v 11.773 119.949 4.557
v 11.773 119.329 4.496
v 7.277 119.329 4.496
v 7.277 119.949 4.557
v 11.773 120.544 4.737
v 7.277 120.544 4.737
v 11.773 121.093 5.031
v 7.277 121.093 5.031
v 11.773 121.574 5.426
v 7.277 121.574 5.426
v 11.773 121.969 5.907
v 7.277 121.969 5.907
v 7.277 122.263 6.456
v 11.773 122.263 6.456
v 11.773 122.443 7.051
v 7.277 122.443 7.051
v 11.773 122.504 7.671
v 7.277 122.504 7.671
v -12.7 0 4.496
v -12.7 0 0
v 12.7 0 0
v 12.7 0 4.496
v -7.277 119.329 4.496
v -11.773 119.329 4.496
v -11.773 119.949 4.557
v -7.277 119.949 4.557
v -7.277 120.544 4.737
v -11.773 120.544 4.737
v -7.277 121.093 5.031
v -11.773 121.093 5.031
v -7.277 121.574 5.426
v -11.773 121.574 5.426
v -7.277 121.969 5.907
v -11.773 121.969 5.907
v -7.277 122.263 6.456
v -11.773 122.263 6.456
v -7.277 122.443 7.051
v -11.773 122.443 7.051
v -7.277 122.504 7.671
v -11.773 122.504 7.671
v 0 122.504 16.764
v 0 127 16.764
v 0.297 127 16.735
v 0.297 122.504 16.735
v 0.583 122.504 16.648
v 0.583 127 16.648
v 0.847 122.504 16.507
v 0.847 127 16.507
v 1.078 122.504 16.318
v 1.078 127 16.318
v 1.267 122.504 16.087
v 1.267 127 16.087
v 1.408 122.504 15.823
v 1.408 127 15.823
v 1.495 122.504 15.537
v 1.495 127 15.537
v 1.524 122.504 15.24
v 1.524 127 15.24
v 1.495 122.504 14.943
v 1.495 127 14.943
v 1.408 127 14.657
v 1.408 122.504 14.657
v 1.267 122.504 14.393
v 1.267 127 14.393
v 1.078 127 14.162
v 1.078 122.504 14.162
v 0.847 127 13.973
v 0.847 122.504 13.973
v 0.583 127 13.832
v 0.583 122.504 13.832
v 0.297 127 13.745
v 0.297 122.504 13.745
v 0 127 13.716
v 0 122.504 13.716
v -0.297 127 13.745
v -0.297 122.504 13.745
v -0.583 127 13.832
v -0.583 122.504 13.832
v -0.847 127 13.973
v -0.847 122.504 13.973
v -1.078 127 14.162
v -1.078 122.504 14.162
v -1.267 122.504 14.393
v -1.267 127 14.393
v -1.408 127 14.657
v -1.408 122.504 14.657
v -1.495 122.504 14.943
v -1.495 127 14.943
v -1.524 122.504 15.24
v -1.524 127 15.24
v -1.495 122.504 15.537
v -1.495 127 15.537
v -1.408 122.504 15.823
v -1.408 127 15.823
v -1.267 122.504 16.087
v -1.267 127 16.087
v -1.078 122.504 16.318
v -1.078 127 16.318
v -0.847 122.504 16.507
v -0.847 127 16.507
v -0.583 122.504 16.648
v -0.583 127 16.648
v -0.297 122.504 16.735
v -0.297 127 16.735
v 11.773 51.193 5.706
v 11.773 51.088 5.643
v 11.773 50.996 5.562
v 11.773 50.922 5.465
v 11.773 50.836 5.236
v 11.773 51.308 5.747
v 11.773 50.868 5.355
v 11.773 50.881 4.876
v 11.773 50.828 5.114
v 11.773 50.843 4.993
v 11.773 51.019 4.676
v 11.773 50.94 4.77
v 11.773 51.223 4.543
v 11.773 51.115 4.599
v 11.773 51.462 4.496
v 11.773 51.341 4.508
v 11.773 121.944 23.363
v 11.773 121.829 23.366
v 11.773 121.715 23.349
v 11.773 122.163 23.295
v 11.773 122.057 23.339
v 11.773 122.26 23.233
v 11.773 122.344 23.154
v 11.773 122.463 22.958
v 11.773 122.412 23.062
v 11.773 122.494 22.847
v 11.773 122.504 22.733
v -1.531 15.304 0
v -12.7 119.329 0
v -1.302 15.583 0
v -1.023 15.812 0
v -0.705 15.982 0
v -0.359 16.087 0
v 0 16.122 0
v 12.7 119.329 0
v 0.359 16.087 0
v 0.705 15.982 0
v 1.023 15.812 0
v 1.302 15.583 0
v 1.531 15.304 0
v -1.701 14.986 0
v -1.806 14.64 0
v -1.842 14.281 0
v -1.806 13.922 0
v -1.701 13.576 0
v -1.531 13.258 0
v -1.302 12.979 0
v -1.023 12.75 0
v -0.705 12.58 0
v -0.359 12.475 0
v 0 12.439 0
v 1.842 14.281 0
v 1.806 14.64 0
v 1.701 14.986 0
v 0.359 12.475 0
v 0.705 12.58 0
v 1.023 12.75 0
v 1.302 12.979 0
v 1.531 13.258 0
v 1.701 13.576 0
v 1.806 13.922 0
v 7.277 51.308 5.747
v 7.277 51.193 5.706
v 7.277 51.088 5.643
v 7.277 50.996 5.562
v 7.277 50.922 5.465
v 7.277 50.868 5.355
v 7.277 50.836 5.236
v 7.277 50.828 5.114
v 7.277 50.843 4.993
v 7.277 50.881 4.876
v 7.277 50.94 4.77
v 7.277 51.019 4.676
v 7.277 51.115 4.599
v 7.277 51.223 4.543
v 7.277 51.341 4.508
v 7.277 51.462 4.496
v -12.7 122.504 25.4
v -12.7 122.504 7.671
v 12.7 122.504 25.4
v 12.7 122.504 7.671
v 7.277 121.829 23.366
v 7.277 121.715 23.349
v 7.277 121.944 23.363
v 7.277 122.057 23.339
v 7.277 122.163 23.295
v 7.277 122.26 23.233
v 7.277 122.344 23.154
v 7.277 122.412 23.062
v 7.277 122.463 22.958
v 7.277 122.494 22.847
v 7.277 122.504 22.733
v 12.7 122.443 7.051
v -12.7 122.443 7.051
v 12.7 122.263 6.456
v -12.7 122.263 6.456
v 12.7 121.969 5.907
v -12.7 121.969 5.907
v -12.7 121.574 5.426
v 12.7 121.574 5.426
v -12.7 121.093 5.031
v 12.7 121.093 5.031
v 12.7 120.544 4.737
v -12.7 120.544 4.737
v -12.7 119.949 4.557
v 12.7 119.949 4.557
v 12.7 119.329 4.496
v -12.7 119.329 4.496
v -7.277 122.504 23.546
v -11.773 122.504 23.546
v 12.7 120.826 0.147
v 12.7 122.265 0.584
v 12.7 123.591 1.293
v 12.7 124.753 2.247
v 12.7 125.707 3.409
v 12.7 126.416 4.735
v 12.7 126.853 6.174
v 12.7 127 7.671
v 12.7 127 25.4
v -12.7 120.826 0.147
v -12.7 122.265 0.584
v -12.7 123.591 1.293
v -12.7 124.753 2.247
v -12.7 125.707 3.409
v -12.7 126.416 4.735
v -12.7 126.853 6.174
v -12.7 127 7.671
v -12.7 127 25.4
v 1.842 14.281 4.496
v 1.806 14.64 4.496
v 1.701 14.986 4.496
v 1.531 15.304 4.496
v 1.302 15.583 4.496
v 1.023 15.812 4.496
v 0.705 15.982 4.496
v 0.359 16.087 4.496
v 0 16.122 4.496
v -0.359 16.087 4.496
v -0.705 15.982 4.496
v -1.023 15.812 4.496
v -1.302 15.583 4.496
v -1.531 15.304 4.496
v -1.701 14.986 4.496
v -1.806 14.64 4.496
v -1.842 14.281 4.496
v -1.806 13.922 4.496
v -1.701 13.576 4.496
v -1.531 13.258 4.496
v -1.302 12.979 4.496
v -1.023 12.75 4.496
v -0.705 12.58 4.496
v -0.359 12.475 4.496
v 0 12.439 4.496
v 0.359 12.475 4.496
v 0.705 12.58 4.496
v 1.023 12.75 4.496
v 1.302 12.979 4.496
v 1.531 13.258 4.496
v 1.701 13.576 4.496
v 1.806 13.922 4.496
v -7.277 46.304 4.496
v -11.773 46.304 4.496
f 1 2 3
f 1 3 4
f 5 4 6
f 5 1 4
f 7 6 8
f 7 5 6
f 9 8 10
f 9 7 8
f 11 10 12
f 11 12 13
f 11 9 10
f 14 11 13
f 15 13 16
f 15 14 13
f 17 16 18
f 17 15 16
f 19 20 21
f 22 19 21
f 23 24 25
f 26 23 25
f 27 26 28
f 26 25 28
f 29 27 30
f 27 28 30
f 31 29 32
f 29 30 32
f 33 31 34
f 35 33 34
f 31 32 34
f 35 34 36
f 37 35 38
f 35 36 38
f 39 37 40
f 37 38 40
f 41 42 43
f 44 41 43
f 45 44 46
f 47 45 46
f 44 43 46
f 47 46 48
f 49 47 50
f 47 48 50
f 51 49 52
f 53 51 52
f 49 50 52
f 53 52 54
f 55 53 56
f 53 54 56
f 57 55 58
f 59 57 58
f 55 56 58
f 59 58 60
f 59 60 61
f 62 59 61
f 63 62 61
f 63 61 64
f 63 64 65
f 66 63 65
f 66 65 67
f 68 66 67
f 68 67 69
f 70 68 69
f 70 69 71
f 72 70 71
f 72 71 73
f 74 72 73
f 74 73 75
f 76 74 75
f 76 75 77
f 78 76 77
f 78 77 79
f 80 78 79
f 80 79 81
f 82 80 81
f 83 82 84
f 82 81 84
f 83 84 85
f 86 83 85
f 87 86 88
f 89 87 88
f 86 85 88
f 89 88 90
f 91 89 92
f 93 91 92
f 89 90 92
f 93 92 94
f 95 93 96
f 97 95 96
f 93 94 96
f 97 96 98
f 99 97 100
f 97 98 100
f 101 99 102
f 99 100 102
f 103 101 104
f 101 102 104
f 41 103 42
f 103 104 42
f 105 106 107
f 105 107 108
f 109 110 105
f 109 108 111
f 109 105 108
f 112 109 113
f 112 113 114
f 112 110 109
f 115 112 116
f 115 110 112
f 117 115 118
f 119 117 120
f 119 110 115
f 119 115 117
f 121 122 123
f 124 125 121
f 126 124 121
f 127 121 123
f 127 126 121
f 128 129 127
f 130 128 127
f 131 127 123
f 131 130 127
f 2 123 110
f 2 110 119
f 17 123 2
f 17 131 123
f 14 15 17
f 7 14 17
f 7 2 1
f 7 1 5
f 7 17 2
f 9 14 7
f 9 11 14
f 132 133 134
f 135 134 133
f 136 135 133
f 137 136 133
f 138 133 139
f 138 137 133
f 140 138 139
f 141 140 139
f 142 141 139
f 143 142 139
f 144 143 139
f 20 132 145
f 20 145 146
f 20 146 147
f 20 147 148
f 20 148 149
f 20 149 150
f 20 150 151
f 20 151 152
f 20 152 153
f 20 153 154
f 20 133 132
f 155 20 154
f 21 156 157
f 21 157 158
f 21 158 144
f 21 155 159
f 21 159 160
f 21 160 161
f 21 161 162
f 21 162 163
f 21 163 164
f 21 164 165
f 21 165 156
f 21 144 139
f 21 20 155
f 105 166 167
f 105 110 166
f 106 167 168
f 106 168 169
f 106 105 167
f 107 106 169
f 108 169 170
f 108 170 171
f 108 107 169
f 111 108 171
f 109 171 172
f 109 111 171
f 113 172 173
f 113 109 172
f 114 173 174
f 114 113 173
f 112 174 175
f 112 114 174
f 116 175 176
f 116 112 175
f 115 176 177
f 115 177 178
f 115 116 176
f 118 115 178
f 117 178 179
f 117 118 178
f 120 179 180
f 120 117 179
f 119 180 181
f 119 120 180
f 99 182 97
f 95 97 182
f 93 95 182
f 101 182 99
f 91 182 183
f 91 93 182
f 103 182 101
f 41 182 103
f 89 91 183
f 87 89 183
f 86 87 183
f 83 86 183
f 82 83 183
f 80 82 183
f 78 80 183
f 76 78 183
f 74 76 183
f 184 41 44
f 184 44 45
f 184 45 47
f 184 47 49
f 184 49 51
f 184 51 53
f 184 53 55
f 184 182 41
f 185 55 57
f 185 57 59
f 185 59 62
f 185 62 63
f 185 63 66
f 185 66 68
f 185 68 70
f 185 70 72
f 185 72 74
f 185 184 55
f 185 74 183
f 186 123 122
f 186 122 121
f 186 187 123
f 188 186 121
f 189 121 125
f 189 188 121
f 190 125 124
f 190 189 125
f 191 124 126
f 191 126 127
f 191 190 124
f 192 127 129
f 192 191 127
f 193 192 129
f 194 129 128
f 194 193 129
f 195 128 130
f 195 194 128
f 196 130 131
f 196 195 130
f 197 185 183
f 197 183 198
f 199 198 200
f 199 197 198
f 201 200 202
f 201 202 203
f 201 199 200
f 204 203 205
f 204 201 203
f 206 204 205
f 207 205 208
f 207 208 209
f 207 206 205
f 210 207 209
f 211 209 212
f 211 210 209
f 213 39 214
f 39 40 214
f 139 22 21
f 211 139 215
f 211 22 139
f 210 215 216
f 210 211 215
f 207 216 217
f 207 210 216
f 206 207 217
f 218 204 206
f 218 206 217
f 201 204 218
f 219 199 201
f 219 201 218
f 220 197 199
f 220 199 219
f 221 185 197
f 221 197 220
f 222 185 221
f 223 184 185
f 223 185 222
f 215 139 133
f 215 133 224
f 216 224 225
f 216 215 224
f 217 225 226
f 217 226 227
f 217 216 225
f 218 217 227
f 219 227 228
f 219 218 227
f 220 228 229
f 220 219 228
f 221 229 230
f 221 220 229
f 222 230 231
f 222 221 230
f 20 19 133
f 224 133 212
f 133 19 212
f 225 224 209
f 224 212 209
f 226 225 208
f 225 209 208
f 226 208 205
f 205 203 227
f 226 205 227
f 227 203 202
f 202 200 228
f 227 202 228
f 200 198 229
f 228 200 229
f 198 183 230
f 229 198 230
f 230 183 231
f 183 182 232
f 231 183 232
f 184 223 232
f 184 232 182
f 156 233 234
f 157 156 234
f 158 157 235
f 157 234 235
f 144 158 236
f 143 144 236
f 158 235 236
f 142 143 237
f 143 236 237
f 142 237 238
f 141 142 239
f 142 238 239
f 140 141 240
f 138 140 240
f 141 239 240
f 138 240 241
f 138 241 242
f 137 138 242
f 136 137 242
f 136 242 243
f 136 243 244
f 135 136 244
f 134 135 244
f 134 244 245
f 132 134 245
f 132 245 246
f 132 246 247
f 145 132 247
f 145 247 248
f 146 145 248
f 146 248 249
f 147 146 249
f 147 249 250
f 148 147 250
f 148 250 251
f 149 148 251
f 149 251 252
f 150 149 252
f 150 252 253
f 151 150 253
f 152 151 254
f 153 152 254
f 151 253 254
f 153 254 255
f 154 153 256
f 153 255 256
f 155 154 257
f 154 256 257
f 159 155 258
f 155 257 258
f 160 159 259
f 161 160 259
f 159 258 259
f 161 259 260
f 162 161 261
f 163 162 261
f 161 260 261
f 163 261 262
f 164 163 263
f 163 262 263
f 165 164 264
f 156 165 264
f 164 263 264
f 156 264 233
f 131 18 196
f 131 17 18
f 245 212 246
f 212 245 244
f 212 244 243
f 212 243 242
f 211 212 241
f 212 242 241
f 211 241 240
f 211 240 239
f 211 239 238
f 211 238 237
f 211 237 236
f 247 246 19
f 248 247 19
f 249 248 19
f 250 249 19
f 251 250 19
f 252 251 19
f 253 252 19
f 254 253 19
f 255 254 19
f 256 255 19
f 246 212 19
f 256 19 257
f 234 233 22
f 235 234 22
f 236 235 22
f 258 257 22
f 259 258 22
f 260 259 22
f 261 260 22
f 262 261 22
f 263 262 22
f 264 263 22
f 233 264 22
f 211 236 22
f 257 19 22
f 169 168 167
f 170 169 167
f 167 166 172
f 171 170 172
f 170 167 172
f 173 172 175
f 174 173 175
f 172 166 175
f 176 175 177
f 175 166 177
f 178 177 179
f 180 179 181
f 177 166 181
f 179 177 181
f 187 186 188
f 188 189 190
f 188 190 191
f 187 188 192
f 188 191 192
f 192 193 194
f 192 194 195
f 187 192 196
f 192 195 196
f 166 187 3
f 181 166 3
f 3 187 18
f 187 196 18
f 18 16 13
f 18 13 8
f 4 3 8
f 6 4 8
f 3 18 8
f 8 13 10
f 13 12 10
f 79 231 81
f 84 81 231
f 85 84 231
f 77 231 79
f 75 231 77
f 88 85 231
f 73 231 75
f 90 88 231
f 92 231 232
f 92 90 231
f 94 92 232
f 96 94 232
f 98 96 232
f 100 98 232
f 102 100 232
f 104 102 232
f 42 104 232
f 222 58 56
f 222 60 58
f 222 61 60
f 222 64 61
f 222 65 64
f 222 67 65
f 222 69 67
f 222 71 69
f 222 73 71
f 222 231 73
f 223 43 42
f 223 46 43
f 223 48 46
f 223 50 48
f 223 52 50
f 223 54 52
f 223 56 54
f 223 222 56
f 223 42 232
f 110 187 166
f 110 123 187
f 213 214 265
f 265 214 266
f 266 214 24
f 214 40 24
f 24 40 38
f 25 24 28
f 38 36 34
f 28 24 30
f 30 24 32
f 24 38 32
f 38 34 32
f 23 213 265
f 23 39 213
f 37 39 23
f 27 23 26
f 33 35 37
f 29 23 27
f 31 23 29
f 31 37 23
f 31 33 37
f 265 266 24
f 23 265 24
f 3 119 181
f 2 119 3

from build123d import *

# Parameters (mm, degrees)
SKETCH2_W                    = 25.4
SKETCH2_H                    = 4.4958
BASE_FLANGE1_DEPTH           = 127
EDGE_FLANGE1_STRIP_W         = 24.3332
EDGE_FLANGE1_STRIP_H         = 4.4958
EDGE_FLANGE1_STRIP_CUT_DEPTH = 25.4
EDGE_FLANGE1_DEPTH           = 25.4
CUT_EXTRUDE1_REACH           = 132.136
SKETCH10_R                   = 1.524
SKETCH11_R                   = 1.8415
CUT_EXTRUDE2_DEPTH           = 130.333969156
BOSS_EXTRUDE1_START          = 9.525
BOSS_EXTRUDE1_DEPTH          = 2.2479
FILLET1_R                    = 0.635


# Sheet-metal steps are written as plain solids
with BuildPart() as part:
    # Sketch2 → Base-Flange1 (new body)
    with BuildSketch(Plane(origin=(0, 0, 0), x_dir=(1, 0, 0), z_dir=(0, 1, 0))):
        with Locations((0, -2.2479)):
            Rectangle(SKETCH2_W, SKETCH2_H)
    extrude(amount=BASE_FLANGE1_DEPTH)

    # Edge-Flange1 strip (across the edge) → Edge-Flange1 strip cut (cut)
    with BuildSketch(Plane(origin=(12.7, 127, 4.4958), x_dir=(0, -1, 0), z_dir=(-1, 0, 0))):
        with Locations((-4.4958, -2.2479)):
            Rectangle(EDGE_FLANGE1_STRIP_W, EDGE_FLANGE1_STRIP_H)
    extrude(amount=EDGE_FLANGE1_STRIP_CUT_DEPTH, mode=Mode.SUBTRACT)

    # Edge-Flange1 section (across the edge) → Edge-Flange1 (add)
    with BuildSketch(Plane(origin=(12.7, 127, 4.4958), x_dir=(0, -1, 0), z_dir=(-1, 0, 0))):
        with BuildLine():
            Line((0, 3.175), (0, 20.9042))
            Line((0, 20.9042), (4.4958, 20.9042))
            Line((4.4958, 20.9042), (4.4958, 3.175))
            ThreePointArc((4.4958, 3.175), (5.42573597, 0.92993597), (7.6708, 0))
            Line((7.6708, 0), (7.6708, -4.4958))
            ThreePointArc((7.6708, -4.4958), (2.246725303, -2.249074697), (0, 3.175))
        make_face()
    extrude(amount=EDGE_FLANGE1_DEPTH)

    # Sketch10 → Cut-Extrude1 (cut, up to next)
    with BuildSketch(Plane(origin=(0, 127, 0), x_dir=(1, 0, 0), z_dir=(0, 1, 0)), mode=Mode.PRIVATE) as cut_extrude1_sk1:
        with Locations(Location((0, -15.24, 0), (0, 0, 270))):
            Circle(SKETCH10_R)
    cut_extrude1_tool1 = extrude(cut_extrude1_sk1.sketch, amount=-CUT_EXTRUDE1_REACH, mode=Mode.PRIVATE) & part.part
    add(cut_extrude1_tool1.solids().sort_by_distance((0, 127, 15.24))[0], mode=Mode.SUBTRACT)

    # Sketch11 → Cut-Extrude2 (cut, through all)
    with BuildSketch(Plane.XY.offset(4.4958)):
        with Locations((0, 14.280866767)):
            Circle(SKETCH11_R)
    extrude(amount=-CUT_EXTRUDE2_DEPTH, mode=Mode.SUBTRACT)


with BuildPart() as body_2:
    # Sketch12 → Boss-Extrude1 (new, symmetric)
    with BuildSketch(Plane(origin=(0, 0, 0), x_dir=(0, 0, -1), z_dir=(1, 0, 0)).offset(BOSS_EXTRUDE1_START)):
        with BuildLine():
            Line((-23.5458, 122.5042), (-4.4958, 46.3042))
            Line((-4.4958, 46.3042), (-4.4958, 119.3292))
            ThreePointArc((-4.4958, 119.3292), (-5.42573597, 121.57426403), (-7.6708, 122.5042))
            Line((-7.6708, 122.5042), (-23.5458, 122.5042))
        make_face()
    extrude(amount=BOSS_EXTRUDE1_DEPTH, both=True)


with BuildPart() as body_3:
    # Mirror2: mirrored copy
    add(body_2.part.mirror(Plane(origin=(0, 0, 0), x_dir=(0, 0, 1), z_dir=(1, 0, 0))))


with BuildPart() as body_2_1:
    add(body_2.part)

    # Fillet1
    fillet1_edges = [body_2_1.edges().sort_by_distance(p)[0] for p in [
        (9.525, 46.3042, 4.4958),
        (9.525, 122.5042, 23.5458),
    ]]
    fillet(fillet1_edges, radius=FILLET1_R)


solid = Compound([part.part, body_3.part, body_2_1.part])
